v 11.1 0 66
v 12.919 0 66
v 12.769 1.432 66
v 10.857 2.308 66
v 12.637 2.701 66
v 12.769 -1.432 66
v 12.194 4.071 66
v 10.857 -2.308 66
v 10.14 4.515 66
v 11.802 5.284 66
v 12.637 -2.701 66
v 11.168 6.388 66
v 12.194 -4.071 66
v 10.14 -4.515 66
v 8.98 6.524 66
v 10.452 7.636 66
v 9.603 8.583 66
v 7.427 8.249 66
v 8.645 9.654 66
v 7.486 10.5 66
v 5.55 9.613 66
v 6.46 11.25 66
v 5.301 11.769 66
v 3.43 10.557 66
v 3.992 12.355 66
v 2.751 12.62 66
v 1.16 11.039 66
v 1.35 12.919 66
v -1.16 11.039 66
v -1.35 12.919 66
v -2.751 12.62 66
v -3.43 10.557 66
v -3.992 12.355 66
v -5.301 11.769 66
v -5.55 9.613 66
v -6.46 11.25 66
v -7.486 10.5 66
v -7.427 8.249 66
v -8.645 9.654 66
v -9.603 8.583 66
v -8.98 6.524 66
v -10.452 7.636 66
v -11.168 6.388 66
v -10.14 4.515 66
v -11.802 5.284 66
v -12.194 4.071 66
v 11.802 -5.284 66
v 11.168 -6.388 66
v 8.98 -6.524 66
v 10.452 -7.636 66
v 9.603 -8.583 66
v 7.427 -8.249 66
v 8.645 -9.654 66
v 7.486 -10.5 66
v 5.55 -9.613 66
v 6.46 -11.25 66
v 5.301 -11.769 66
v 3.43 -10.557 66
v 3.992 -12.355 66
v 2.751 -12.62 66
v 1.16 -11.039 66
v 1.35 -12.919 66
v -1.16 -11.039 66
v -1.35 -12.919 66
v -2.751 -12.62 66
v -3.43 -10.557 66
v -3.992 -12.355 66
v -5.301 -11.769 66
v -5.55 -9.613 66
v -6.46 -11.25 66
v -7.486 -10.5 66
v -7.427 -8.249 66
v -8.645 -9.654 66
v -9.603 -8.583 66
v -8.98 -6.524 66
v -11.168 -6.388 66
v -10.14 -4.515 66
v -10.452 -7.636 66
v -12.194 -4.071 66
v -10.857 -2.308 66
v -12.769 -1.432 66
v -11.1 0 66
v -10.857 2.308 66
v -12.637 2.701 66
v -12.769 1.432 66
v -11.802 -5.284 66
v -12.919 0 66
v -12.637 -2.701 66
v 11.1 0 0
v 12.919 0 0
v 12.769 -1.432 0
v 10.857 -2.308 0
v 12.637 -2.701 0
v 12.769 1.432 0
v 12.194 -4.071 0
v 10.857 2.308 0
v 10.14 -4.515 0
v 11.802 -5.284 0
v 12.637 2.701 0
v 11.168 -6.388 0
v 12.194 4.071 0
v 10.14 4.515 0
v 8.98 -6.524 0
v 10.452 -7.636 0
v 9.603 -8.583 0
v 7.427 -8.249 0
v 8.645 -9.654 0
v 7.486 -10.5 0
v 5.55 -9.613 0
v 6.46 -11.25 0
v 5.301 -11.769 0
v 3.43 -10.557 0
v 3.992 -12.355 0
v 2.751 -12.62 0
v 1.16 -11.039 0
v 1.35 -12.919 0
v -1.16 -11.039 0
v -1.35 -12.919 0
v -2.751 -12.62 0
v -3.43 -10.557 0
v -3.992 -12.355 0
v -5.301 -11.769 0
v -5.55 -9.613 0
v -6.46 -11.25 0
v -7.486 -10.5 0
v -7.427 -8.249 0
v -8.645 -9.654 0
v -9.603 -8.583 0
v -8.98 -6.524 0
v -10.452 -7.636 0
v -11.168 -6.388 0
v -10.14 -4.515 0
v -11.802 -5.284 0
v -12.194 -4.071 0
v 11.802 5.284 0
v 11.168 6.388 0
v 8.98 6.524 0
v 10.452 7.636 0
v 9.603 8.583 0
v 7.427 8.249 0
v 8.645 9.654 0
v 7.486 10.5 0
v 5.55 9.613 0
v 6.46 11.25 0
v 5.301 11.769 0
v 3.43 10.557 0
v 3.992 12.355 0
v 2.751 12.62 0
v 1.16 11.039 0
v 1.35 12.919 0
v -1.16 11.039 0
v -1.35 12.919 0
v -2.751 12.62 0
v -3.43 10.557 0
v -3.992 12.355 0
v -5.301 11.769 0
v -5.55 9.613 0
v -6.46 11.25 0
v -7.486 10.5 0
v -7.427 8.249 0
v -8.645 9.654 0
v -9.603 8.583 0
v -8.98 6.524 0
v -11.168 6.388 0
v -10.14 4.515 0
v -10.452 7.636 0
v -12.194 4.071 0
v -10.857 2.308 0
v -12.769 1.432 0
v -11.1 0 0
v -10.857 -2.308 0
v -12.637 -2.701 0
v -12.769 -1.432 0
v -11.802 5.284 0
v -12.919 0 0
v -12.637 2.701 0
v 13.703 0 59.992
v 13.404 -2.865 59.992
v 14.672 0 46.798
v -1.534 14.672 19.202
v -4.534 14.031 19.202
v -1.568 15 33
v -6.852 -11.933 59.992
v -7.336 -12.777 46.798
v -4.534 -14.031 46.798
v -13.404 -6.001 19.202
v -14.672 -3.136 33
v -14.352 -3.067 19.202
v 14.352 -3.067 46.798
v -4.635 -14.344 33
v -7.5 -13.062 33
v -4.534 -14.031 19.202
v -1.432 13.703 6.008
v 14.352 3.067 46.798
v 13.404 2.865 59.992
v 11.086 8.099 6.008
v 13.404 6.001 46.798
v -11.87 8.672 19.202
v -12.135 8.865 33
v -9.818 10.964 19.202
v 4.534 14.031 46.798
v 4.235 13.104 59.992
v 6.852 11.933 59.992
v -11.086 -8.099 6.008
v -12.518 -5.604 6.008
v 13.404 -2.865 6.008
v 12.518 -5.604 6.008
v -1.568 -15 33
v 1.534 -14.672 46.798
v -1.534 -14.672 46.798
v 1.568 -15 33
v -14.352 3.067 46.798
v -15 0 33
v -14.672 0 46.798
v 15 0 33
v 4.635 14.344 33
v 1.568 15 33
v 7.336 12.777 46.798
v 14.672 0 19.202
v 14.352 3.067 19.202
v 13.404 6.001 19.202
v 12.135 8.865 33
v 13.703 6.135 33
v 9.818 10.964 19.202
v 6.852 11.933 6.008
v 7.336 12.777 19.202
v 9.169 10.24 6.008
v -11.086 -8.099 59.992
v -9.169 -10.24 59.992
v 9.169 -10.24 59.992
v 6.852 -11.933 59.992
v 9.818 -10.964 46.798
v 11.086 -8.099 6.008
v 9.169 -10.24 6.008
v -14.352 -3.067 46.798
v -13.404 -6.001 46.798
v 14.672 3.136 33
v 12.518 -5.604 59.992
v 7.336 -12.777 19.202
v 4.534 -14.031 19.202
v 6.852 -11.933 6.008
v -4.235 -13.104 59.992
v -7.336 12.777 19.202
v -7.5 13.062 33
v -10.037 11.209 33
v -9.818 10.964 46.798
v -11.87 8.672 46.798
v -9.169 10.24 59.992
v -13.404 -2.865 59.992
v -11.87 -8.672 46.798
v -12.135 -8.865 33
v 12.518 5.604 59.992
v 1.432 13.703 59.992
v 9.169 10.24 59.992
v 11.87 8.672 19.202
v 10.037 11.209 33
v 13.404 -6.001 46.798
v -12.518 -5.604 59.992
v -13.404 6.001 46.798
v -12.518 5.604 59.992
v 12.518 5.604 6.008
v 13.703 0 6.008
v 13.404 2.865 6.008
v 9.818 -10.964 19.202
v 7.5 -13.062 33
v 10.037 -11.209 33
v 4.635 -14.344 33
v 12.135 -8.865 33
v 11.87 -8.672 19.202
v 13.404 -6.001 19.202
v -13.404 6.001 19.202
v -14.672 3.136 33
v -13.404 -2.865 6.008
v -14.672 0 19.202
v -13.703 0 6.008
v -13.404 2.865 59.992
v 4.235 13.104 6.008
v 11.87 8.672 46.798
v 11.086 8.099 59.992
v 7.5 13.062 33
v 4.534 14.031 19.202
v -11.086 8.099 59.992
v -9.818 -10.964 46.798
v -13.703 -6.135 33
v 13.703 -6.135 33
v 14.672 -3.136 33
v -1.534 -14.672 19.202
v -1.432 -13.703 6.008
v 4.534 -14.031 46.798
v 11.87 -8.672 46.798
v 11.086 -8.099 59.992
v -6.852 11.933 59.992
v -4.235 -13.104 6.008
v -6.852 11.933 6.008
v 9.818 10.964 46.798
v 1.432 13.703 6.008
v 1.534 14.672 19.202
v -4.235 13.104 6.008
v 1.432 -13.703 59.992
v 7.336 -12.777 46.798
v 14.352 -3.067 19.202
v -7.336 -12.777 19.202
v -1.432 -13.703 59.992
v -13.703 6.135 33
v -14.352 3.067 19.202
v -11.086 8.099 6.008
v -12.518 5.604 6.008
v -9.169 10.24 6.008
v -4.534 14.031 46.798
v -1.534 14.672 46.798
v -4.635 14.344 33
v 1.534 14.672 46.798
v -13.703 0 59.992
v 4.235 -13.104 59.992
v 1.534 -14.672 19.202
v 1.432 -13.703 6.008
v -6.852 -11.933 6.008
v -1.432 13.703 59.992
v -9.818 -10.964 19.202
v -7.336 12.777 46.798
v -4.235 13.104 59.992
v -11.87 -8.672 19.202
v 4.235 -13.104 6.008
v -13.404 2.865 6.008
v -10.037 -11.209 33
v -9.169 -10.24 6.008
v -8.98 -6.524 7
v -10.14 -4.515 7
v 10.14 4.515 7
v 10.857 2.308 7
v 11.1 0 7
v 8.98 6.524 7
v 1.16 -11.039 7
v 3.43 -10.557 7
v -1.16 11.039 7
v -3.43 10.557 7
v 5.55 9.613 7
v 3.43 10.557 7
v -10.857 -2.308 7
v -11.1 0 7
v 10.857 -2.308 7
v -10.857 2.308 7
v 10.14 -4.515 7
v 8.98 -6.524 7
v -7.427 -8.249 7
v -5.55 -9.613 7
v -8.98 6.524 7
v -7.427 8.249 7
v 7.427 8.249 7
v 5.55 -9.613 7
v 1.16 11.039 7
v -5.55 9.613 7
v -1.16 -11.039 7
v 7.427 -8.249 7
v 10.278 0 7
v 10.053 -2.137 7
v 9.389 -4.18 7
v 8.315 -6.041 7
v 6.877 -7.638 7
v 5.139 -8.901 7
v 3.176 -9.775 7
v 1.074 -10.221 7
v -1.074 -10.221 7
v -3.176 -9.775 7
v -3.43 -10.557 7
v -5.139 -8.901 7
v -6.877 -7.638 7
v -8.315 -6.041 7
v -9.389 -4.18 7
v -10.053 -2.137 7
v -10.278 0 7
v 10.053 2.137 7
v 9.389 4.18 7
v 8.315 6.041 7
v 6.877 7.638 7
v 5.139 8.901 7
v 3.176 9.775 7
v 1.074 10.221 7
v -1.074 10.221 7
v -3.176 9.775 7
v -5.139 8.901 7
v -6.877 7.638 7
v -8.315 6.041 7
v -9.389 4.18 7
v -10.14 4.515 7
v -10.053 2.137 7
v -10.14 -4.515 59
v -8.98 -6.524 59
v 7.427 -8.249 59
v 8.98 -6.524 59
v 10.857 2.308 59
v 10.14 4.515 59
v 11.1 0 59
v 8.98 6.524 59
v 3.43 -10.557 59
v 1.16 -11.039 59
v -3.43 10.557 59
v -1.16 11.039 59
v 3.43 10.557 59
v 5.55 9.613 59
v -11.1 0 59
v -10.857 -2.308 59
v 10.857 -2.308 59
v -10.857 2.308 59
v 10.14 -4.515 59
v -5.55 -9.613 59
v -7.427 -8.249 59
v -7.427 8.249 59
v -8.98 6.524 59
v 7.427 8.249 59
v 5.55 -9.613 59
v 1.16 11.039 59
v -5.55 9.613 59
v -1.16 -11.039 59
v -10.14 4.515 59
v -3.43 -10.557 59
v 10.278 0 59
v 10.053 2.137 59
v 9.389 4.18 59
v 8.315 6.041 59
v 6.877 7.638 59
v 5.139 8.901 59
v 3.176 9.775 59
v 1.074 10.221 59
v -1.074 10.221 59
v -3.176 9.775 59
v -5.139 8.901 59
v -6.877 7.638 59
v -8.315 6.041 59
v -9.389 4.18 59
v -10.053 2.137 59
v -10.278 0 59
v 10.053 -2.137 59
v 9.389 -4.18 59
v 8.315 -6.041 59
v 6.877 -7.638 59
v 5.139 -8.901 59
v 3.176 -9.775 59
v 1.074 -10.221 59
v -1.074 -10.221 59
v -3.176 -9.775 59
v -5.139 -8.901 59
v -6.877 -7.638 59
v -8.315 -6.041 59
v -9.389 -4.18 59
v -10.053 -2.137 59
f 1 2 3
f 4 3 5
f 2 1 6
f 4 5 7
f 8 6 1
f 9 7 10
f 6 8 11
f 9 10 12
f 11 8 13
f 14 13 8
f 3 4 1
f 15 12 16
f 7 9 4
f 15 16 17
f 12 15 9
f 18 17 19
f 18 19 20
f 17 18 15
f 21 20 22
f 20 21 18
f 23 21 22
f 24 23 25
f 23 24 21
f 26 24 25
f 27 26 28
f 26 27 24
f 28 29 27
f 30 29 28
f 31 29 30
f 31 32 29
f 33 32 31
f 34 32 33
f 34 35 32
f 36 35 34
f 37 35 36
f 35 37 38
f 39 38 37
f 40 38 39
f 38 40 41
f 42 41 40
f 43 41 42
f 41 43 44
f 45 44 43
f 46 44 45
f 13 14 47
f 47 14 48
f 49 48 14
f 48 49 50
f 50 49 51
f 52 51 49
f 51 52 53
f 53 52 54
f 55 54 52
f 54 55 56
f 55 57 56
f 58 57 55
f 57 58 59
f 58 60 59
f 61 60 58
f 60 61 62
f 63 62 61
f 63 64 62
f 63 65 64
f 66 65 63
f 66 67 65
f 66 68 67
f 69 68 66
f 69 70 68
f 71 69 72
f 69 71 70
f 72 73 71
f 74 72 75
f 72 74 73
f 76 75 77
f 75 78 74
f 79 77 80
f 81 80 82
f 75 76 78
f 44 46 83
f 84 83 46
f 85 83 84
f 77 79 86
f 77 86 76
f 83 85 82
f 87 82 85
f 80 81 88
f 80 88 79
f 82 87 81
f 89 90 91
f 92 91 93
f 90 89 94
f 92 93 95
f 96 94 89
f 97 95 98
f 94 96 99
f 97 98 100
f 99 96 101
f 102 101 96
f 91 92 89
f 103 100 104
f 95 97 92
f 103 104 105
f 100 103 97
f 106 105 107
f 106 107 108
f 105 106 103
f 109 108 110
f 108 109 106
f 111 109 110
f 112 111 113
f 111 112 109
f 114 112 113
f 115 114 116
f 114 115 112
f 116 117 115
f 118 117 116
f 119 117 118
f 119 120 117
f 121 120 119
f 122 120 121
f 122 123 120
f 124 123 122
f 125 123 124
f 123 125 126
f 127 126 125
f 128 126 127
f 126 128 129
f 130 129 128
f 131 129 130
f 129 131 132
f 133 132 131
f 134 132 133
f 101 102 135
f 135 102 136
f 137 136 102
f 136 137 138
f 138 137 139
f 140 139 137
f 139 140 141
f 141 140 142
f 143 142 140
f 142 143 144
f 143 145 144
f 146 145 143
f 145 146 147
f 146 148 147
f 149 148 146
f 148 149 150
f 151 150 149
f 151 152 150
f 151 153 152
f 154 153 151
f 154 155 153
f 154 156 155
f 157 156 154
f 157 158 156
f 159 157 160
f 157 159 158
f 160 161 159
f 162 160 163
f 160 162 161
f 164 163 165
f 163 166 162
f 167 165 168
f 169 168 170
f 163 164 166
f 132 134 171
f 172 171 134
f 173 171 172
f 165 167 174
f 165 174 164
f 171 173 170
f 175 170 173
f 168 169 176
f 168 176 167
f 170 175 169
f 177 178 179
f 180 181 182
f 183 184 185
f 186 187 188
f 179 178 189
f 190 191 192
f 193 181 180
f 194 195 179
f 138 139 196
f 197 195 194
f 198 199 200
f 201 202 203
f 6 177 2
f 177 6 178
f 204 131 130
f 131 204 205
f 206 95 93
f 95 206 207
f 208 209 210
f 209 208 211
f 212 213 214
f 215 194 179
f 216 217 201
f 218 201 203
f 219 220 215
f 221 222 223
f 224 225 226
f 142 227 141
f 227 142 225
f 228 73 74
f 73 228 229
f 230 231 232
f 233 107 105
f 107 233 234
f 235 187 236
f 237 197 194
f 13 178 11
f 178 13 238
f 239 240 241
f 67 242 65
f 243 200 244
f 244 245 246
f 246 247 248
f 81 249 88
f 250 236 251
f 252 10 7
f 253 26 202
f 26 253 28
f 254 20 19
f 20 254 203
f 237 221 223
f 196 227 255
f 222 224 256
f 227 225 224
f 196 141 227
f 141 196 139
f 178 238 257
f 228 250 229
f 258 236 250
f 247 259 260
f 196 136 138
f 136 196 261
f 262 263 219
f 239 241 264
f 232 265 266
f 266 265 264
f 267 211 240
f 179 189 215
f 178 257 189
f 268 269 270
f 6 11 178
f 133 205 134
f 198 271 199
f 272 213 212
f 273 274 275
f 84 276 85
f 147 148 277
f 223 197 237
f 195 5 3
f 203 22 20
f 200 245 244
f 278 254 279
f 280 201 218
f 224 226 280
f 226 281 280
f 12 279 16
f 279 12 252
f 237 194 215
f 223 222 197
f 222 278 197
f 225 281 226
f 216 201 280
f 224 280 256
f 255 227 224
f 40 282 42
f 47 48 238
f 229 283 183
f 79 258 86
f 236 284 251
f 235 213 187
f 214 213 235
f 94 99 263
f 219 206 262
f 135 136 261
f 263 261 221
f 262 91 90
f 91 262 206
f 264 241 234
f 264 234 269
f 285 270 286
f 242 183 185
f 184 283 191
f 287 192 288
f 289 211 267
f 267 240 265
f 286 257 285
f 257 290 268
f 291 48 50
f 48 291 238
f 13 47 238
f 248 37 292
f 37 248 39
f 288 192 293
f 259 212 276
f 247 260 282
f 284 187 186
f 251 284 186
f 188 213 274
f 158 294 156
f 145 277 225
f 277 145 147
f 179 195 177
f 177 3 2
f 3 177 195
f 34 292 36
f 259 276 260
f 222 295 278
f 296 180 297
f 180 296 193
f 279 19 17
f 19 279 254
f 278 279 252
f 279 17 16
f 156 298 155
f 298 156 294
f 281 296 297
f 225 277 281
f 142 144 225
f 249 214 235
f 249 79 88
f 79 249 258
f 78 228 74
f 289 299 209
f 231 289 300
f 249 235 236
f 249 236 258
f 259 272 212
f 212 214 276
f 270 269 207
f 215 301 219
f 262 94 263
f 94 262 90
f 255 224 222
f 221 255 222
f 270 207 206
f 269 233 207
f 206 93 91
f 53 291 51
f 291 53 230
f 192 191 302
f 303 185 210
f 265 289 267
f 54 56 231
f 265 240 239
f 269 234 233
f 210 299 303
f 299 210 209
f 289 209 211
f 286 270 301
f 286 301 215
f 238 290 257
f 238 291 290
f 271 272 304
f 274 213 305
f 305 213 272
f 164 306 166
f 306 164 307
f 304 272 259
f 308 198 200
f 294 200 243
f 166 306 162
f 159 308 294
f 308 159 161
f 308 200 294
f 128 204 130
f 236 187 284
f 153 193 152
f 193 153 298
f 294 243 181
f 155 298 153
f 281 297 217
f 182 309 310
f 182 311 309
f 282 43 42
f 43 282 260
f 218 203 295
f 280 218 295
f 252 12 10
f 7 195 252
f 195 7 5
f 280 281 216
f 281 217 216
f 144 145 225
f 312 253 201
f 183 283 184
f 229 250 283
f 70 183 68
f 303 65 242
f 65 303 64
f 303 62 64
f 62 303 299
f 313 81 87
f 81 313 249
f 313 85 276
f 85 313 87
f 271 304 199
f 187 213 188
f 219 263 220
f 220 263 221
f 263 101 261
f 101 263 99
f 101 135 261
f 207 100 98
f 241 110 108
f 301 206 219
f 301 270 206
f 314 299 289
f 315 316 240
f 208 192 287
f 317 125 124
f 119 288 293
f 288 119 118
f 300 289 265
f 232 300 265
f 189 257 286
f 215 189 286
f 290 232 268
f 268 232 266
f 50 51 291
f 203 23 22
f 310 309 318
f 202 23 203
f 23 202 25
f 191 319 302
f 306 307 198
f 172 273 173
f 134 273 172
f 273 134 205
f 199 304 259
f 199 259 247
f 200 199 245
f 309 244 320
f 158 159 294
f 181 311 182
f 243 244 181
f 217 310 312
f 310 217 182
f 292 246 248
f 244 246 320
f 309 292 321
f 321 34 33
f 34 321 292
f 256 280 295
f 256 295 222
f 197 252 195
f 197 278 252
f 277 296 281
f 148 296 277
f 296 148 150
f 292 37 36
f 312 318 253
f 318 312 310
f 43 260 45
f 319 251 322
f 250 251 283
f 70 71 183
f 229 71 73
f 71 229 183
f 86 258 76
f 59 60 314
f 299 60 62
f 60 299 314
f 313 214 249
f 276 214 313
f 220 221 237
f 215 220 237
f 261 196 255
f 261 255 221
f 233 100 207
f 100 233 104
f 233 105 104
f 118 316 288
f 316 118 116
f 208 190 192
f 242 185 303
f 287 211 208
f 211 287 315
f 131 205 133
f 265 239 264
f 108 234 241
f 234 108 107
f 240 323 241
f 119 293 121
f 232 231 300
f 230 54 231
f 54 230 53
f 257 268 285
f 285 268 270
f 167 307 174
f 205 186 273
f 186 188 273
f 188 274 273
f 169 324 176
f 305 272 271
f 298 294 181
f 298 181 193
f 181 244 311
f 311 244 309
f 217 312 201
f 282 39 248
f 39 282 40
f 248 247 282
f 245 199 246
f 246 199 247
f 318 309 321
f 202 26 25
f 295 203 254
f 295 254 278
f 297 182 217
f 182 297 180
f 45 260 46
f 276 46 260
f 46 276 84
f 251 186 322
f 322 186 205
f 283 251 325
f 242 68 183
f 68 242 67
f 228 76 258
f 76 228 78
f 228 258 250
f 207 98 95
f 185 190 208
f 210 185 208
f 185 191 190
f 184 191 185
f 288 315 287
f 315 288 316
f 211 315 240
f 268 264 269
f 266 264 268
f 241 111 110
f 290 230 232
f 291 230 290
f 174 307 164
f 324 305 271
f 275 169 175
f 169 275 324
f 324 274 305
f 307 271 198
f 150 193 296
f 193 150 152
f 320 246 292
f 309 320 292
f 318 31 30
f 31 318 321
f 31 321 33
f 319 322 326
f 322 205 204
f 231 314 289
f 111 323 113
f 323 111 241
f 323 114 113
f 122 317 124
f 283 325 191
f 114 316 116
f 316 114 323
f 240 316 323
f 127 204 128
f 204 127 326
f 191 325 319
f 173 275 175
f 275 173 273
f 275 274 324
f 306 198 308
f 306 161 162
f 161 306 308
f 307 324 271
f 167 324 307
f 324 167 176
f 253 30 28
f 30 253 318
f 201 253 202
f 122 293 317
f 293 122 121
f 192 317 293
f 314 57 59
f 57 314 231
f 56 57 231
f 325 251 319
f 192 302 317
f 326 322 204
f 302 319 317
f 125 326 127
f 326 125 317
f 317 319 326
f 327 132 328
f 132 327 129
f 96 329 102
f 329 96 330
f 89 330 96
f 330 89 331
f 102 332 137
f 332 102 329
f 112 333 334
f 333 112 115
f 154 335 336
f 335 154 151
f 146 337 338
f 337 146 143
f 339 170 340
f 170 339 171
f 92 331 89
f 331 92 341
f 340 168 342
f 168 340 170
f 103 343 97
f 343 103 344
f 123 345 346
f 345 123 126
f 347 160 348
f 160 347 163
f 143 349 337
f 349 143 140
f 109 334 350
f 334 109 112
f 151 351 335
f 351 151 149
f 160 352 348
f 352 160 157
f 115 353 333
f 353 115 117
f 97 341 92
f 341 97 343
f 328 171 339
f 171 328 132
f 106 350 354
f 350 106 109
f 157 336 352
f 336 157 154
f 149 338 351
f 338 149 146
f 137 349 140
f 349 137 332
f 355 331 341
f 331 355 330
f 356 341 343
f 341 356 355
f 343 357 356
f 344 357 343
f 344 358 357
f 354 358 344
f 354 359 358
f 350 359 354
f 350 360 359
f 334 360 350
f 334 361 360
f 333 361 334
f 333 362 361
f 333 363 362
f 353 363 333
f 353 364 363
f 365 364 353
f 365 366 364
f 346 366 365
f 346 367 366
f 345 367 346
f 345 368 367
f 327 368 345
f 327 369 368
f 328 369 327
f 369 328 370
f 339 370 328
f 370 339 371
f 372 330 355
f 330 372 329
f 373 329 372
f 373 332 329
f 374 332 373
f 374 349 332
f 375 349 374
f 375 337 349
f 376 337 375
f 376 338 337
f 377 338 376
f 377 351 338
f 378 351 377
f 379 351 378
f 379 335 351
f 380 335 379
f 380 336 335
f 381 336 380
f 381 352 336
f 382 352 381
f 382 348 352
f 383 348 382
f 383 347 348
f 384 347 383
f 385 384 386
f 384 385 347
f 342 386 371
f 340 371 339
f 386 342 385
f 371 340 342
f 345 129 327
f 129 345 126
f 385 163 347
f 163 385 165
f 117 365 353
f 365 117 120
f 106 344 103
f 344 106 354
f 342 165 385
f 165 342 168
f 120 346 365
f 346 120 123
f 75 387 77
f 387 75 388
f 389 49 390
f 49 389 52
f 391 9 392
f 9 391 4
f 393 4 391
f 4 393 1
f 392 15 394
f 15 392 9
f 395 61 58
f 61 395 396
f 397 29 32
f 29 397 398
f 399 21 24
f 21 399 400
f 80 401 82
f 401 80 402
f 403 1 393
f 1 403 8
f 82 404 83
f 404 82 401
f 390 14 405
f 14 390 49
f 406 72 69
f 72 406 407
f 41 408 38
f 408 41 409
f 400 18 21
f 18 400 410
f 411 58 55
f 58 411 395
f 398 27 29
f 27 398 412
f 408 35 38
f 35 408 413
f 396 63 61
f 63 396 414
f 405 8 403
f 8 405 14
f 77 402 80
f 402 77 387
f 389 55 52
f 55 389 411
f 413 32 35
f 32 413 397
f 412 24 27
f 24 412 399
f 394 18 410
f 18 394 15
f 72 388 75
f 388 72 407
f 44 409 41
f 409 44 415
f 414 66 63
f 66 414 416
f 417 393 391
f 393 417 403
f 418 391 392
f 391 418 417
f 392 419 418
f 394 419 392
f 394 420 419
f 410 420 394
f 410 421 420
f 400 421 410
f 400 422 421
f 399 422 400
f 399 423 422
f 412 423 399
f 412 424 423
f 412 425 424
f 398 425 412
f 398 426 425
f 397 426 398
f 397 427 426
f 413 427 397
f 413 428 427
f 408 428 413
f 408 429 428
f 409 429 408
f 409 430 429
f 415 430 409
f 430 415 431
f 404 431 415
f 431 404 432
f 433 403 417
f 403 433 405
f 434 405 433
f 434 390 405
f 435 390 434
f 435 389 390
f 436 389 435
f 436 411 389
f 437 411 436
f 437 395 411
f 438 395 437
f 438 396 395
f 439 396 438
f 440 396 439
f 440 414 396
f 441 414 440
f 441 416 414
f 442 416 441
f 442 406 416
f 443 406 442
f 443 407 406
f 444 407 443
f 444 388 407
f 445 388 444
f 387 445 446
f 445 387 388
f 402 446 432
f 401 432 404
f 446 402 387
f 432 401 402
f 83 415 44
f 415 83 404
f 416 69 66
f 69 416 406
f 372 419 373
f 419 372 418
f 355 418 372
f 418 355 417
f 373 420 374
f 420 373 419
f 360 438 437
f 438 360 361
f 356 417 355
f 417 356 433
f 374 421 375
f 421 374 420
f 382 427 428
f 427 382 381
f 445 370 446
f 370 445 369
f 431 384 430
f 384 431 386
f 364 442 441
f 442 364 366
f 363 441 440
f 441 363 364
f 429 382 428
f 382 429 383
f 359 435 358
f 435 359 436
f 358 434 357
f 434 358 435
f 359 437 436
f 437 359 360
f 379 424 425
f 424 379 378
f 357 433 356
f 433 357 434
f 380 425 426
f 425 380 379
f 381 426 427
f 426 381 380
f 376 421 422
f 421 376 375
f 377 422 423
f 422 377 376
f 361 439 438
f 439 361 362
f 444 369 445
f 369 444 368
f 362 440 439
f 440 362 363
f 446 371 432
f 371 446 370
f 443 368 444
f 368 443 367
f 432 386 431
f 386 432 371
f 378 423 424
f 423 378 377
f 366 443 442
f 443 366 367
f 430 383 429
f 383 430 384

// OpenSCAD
// Jim Samson
// Spool for rat project 
// November 13, 2018

$fs=0.1;

offsetForEnds=6;

beltHeight=60+(offsetForEnds); // millimeters
diameterForBelt=30;

diameterForEdgesHeight=2;
diameterForEdges = diameterForBelt + 4;

bearingDiameter=22.2;
bearingHeight=8;

spoolHolder();

module spoolHolder() {
    union() {
        difference() {
            spool();
            #bearings();
            middleShaft();
        }
    }
}



module middleShaft() {
    cylinder(d=bearingDiameter/1.08,h=beltHeight);
}

module bearings() {
    translate([0,0,-1]) {
        cylinder(d=bearingDiameter,h=bearingHeight);
    }
    
    translate([0,0,beltHeight-bearingHeight+1]) {
        cylinder(d=bearingDiameter,h=bearingHeight);
    }
}

module spool() {
    translate([0,0,beltHeight/2]) {
        intersection() {
            cube([beltHeight,beltHeight,beltHeight], center=true); 
            resize([diameterForBelt,diameterForBelt,beltHeight*2])
            sphere(r=10);
            }
      }
}

module oval(w,h, height, center = false) {
 scale([1, h/w, 1]) cylinder(h=height, r=w, center=center);
}
